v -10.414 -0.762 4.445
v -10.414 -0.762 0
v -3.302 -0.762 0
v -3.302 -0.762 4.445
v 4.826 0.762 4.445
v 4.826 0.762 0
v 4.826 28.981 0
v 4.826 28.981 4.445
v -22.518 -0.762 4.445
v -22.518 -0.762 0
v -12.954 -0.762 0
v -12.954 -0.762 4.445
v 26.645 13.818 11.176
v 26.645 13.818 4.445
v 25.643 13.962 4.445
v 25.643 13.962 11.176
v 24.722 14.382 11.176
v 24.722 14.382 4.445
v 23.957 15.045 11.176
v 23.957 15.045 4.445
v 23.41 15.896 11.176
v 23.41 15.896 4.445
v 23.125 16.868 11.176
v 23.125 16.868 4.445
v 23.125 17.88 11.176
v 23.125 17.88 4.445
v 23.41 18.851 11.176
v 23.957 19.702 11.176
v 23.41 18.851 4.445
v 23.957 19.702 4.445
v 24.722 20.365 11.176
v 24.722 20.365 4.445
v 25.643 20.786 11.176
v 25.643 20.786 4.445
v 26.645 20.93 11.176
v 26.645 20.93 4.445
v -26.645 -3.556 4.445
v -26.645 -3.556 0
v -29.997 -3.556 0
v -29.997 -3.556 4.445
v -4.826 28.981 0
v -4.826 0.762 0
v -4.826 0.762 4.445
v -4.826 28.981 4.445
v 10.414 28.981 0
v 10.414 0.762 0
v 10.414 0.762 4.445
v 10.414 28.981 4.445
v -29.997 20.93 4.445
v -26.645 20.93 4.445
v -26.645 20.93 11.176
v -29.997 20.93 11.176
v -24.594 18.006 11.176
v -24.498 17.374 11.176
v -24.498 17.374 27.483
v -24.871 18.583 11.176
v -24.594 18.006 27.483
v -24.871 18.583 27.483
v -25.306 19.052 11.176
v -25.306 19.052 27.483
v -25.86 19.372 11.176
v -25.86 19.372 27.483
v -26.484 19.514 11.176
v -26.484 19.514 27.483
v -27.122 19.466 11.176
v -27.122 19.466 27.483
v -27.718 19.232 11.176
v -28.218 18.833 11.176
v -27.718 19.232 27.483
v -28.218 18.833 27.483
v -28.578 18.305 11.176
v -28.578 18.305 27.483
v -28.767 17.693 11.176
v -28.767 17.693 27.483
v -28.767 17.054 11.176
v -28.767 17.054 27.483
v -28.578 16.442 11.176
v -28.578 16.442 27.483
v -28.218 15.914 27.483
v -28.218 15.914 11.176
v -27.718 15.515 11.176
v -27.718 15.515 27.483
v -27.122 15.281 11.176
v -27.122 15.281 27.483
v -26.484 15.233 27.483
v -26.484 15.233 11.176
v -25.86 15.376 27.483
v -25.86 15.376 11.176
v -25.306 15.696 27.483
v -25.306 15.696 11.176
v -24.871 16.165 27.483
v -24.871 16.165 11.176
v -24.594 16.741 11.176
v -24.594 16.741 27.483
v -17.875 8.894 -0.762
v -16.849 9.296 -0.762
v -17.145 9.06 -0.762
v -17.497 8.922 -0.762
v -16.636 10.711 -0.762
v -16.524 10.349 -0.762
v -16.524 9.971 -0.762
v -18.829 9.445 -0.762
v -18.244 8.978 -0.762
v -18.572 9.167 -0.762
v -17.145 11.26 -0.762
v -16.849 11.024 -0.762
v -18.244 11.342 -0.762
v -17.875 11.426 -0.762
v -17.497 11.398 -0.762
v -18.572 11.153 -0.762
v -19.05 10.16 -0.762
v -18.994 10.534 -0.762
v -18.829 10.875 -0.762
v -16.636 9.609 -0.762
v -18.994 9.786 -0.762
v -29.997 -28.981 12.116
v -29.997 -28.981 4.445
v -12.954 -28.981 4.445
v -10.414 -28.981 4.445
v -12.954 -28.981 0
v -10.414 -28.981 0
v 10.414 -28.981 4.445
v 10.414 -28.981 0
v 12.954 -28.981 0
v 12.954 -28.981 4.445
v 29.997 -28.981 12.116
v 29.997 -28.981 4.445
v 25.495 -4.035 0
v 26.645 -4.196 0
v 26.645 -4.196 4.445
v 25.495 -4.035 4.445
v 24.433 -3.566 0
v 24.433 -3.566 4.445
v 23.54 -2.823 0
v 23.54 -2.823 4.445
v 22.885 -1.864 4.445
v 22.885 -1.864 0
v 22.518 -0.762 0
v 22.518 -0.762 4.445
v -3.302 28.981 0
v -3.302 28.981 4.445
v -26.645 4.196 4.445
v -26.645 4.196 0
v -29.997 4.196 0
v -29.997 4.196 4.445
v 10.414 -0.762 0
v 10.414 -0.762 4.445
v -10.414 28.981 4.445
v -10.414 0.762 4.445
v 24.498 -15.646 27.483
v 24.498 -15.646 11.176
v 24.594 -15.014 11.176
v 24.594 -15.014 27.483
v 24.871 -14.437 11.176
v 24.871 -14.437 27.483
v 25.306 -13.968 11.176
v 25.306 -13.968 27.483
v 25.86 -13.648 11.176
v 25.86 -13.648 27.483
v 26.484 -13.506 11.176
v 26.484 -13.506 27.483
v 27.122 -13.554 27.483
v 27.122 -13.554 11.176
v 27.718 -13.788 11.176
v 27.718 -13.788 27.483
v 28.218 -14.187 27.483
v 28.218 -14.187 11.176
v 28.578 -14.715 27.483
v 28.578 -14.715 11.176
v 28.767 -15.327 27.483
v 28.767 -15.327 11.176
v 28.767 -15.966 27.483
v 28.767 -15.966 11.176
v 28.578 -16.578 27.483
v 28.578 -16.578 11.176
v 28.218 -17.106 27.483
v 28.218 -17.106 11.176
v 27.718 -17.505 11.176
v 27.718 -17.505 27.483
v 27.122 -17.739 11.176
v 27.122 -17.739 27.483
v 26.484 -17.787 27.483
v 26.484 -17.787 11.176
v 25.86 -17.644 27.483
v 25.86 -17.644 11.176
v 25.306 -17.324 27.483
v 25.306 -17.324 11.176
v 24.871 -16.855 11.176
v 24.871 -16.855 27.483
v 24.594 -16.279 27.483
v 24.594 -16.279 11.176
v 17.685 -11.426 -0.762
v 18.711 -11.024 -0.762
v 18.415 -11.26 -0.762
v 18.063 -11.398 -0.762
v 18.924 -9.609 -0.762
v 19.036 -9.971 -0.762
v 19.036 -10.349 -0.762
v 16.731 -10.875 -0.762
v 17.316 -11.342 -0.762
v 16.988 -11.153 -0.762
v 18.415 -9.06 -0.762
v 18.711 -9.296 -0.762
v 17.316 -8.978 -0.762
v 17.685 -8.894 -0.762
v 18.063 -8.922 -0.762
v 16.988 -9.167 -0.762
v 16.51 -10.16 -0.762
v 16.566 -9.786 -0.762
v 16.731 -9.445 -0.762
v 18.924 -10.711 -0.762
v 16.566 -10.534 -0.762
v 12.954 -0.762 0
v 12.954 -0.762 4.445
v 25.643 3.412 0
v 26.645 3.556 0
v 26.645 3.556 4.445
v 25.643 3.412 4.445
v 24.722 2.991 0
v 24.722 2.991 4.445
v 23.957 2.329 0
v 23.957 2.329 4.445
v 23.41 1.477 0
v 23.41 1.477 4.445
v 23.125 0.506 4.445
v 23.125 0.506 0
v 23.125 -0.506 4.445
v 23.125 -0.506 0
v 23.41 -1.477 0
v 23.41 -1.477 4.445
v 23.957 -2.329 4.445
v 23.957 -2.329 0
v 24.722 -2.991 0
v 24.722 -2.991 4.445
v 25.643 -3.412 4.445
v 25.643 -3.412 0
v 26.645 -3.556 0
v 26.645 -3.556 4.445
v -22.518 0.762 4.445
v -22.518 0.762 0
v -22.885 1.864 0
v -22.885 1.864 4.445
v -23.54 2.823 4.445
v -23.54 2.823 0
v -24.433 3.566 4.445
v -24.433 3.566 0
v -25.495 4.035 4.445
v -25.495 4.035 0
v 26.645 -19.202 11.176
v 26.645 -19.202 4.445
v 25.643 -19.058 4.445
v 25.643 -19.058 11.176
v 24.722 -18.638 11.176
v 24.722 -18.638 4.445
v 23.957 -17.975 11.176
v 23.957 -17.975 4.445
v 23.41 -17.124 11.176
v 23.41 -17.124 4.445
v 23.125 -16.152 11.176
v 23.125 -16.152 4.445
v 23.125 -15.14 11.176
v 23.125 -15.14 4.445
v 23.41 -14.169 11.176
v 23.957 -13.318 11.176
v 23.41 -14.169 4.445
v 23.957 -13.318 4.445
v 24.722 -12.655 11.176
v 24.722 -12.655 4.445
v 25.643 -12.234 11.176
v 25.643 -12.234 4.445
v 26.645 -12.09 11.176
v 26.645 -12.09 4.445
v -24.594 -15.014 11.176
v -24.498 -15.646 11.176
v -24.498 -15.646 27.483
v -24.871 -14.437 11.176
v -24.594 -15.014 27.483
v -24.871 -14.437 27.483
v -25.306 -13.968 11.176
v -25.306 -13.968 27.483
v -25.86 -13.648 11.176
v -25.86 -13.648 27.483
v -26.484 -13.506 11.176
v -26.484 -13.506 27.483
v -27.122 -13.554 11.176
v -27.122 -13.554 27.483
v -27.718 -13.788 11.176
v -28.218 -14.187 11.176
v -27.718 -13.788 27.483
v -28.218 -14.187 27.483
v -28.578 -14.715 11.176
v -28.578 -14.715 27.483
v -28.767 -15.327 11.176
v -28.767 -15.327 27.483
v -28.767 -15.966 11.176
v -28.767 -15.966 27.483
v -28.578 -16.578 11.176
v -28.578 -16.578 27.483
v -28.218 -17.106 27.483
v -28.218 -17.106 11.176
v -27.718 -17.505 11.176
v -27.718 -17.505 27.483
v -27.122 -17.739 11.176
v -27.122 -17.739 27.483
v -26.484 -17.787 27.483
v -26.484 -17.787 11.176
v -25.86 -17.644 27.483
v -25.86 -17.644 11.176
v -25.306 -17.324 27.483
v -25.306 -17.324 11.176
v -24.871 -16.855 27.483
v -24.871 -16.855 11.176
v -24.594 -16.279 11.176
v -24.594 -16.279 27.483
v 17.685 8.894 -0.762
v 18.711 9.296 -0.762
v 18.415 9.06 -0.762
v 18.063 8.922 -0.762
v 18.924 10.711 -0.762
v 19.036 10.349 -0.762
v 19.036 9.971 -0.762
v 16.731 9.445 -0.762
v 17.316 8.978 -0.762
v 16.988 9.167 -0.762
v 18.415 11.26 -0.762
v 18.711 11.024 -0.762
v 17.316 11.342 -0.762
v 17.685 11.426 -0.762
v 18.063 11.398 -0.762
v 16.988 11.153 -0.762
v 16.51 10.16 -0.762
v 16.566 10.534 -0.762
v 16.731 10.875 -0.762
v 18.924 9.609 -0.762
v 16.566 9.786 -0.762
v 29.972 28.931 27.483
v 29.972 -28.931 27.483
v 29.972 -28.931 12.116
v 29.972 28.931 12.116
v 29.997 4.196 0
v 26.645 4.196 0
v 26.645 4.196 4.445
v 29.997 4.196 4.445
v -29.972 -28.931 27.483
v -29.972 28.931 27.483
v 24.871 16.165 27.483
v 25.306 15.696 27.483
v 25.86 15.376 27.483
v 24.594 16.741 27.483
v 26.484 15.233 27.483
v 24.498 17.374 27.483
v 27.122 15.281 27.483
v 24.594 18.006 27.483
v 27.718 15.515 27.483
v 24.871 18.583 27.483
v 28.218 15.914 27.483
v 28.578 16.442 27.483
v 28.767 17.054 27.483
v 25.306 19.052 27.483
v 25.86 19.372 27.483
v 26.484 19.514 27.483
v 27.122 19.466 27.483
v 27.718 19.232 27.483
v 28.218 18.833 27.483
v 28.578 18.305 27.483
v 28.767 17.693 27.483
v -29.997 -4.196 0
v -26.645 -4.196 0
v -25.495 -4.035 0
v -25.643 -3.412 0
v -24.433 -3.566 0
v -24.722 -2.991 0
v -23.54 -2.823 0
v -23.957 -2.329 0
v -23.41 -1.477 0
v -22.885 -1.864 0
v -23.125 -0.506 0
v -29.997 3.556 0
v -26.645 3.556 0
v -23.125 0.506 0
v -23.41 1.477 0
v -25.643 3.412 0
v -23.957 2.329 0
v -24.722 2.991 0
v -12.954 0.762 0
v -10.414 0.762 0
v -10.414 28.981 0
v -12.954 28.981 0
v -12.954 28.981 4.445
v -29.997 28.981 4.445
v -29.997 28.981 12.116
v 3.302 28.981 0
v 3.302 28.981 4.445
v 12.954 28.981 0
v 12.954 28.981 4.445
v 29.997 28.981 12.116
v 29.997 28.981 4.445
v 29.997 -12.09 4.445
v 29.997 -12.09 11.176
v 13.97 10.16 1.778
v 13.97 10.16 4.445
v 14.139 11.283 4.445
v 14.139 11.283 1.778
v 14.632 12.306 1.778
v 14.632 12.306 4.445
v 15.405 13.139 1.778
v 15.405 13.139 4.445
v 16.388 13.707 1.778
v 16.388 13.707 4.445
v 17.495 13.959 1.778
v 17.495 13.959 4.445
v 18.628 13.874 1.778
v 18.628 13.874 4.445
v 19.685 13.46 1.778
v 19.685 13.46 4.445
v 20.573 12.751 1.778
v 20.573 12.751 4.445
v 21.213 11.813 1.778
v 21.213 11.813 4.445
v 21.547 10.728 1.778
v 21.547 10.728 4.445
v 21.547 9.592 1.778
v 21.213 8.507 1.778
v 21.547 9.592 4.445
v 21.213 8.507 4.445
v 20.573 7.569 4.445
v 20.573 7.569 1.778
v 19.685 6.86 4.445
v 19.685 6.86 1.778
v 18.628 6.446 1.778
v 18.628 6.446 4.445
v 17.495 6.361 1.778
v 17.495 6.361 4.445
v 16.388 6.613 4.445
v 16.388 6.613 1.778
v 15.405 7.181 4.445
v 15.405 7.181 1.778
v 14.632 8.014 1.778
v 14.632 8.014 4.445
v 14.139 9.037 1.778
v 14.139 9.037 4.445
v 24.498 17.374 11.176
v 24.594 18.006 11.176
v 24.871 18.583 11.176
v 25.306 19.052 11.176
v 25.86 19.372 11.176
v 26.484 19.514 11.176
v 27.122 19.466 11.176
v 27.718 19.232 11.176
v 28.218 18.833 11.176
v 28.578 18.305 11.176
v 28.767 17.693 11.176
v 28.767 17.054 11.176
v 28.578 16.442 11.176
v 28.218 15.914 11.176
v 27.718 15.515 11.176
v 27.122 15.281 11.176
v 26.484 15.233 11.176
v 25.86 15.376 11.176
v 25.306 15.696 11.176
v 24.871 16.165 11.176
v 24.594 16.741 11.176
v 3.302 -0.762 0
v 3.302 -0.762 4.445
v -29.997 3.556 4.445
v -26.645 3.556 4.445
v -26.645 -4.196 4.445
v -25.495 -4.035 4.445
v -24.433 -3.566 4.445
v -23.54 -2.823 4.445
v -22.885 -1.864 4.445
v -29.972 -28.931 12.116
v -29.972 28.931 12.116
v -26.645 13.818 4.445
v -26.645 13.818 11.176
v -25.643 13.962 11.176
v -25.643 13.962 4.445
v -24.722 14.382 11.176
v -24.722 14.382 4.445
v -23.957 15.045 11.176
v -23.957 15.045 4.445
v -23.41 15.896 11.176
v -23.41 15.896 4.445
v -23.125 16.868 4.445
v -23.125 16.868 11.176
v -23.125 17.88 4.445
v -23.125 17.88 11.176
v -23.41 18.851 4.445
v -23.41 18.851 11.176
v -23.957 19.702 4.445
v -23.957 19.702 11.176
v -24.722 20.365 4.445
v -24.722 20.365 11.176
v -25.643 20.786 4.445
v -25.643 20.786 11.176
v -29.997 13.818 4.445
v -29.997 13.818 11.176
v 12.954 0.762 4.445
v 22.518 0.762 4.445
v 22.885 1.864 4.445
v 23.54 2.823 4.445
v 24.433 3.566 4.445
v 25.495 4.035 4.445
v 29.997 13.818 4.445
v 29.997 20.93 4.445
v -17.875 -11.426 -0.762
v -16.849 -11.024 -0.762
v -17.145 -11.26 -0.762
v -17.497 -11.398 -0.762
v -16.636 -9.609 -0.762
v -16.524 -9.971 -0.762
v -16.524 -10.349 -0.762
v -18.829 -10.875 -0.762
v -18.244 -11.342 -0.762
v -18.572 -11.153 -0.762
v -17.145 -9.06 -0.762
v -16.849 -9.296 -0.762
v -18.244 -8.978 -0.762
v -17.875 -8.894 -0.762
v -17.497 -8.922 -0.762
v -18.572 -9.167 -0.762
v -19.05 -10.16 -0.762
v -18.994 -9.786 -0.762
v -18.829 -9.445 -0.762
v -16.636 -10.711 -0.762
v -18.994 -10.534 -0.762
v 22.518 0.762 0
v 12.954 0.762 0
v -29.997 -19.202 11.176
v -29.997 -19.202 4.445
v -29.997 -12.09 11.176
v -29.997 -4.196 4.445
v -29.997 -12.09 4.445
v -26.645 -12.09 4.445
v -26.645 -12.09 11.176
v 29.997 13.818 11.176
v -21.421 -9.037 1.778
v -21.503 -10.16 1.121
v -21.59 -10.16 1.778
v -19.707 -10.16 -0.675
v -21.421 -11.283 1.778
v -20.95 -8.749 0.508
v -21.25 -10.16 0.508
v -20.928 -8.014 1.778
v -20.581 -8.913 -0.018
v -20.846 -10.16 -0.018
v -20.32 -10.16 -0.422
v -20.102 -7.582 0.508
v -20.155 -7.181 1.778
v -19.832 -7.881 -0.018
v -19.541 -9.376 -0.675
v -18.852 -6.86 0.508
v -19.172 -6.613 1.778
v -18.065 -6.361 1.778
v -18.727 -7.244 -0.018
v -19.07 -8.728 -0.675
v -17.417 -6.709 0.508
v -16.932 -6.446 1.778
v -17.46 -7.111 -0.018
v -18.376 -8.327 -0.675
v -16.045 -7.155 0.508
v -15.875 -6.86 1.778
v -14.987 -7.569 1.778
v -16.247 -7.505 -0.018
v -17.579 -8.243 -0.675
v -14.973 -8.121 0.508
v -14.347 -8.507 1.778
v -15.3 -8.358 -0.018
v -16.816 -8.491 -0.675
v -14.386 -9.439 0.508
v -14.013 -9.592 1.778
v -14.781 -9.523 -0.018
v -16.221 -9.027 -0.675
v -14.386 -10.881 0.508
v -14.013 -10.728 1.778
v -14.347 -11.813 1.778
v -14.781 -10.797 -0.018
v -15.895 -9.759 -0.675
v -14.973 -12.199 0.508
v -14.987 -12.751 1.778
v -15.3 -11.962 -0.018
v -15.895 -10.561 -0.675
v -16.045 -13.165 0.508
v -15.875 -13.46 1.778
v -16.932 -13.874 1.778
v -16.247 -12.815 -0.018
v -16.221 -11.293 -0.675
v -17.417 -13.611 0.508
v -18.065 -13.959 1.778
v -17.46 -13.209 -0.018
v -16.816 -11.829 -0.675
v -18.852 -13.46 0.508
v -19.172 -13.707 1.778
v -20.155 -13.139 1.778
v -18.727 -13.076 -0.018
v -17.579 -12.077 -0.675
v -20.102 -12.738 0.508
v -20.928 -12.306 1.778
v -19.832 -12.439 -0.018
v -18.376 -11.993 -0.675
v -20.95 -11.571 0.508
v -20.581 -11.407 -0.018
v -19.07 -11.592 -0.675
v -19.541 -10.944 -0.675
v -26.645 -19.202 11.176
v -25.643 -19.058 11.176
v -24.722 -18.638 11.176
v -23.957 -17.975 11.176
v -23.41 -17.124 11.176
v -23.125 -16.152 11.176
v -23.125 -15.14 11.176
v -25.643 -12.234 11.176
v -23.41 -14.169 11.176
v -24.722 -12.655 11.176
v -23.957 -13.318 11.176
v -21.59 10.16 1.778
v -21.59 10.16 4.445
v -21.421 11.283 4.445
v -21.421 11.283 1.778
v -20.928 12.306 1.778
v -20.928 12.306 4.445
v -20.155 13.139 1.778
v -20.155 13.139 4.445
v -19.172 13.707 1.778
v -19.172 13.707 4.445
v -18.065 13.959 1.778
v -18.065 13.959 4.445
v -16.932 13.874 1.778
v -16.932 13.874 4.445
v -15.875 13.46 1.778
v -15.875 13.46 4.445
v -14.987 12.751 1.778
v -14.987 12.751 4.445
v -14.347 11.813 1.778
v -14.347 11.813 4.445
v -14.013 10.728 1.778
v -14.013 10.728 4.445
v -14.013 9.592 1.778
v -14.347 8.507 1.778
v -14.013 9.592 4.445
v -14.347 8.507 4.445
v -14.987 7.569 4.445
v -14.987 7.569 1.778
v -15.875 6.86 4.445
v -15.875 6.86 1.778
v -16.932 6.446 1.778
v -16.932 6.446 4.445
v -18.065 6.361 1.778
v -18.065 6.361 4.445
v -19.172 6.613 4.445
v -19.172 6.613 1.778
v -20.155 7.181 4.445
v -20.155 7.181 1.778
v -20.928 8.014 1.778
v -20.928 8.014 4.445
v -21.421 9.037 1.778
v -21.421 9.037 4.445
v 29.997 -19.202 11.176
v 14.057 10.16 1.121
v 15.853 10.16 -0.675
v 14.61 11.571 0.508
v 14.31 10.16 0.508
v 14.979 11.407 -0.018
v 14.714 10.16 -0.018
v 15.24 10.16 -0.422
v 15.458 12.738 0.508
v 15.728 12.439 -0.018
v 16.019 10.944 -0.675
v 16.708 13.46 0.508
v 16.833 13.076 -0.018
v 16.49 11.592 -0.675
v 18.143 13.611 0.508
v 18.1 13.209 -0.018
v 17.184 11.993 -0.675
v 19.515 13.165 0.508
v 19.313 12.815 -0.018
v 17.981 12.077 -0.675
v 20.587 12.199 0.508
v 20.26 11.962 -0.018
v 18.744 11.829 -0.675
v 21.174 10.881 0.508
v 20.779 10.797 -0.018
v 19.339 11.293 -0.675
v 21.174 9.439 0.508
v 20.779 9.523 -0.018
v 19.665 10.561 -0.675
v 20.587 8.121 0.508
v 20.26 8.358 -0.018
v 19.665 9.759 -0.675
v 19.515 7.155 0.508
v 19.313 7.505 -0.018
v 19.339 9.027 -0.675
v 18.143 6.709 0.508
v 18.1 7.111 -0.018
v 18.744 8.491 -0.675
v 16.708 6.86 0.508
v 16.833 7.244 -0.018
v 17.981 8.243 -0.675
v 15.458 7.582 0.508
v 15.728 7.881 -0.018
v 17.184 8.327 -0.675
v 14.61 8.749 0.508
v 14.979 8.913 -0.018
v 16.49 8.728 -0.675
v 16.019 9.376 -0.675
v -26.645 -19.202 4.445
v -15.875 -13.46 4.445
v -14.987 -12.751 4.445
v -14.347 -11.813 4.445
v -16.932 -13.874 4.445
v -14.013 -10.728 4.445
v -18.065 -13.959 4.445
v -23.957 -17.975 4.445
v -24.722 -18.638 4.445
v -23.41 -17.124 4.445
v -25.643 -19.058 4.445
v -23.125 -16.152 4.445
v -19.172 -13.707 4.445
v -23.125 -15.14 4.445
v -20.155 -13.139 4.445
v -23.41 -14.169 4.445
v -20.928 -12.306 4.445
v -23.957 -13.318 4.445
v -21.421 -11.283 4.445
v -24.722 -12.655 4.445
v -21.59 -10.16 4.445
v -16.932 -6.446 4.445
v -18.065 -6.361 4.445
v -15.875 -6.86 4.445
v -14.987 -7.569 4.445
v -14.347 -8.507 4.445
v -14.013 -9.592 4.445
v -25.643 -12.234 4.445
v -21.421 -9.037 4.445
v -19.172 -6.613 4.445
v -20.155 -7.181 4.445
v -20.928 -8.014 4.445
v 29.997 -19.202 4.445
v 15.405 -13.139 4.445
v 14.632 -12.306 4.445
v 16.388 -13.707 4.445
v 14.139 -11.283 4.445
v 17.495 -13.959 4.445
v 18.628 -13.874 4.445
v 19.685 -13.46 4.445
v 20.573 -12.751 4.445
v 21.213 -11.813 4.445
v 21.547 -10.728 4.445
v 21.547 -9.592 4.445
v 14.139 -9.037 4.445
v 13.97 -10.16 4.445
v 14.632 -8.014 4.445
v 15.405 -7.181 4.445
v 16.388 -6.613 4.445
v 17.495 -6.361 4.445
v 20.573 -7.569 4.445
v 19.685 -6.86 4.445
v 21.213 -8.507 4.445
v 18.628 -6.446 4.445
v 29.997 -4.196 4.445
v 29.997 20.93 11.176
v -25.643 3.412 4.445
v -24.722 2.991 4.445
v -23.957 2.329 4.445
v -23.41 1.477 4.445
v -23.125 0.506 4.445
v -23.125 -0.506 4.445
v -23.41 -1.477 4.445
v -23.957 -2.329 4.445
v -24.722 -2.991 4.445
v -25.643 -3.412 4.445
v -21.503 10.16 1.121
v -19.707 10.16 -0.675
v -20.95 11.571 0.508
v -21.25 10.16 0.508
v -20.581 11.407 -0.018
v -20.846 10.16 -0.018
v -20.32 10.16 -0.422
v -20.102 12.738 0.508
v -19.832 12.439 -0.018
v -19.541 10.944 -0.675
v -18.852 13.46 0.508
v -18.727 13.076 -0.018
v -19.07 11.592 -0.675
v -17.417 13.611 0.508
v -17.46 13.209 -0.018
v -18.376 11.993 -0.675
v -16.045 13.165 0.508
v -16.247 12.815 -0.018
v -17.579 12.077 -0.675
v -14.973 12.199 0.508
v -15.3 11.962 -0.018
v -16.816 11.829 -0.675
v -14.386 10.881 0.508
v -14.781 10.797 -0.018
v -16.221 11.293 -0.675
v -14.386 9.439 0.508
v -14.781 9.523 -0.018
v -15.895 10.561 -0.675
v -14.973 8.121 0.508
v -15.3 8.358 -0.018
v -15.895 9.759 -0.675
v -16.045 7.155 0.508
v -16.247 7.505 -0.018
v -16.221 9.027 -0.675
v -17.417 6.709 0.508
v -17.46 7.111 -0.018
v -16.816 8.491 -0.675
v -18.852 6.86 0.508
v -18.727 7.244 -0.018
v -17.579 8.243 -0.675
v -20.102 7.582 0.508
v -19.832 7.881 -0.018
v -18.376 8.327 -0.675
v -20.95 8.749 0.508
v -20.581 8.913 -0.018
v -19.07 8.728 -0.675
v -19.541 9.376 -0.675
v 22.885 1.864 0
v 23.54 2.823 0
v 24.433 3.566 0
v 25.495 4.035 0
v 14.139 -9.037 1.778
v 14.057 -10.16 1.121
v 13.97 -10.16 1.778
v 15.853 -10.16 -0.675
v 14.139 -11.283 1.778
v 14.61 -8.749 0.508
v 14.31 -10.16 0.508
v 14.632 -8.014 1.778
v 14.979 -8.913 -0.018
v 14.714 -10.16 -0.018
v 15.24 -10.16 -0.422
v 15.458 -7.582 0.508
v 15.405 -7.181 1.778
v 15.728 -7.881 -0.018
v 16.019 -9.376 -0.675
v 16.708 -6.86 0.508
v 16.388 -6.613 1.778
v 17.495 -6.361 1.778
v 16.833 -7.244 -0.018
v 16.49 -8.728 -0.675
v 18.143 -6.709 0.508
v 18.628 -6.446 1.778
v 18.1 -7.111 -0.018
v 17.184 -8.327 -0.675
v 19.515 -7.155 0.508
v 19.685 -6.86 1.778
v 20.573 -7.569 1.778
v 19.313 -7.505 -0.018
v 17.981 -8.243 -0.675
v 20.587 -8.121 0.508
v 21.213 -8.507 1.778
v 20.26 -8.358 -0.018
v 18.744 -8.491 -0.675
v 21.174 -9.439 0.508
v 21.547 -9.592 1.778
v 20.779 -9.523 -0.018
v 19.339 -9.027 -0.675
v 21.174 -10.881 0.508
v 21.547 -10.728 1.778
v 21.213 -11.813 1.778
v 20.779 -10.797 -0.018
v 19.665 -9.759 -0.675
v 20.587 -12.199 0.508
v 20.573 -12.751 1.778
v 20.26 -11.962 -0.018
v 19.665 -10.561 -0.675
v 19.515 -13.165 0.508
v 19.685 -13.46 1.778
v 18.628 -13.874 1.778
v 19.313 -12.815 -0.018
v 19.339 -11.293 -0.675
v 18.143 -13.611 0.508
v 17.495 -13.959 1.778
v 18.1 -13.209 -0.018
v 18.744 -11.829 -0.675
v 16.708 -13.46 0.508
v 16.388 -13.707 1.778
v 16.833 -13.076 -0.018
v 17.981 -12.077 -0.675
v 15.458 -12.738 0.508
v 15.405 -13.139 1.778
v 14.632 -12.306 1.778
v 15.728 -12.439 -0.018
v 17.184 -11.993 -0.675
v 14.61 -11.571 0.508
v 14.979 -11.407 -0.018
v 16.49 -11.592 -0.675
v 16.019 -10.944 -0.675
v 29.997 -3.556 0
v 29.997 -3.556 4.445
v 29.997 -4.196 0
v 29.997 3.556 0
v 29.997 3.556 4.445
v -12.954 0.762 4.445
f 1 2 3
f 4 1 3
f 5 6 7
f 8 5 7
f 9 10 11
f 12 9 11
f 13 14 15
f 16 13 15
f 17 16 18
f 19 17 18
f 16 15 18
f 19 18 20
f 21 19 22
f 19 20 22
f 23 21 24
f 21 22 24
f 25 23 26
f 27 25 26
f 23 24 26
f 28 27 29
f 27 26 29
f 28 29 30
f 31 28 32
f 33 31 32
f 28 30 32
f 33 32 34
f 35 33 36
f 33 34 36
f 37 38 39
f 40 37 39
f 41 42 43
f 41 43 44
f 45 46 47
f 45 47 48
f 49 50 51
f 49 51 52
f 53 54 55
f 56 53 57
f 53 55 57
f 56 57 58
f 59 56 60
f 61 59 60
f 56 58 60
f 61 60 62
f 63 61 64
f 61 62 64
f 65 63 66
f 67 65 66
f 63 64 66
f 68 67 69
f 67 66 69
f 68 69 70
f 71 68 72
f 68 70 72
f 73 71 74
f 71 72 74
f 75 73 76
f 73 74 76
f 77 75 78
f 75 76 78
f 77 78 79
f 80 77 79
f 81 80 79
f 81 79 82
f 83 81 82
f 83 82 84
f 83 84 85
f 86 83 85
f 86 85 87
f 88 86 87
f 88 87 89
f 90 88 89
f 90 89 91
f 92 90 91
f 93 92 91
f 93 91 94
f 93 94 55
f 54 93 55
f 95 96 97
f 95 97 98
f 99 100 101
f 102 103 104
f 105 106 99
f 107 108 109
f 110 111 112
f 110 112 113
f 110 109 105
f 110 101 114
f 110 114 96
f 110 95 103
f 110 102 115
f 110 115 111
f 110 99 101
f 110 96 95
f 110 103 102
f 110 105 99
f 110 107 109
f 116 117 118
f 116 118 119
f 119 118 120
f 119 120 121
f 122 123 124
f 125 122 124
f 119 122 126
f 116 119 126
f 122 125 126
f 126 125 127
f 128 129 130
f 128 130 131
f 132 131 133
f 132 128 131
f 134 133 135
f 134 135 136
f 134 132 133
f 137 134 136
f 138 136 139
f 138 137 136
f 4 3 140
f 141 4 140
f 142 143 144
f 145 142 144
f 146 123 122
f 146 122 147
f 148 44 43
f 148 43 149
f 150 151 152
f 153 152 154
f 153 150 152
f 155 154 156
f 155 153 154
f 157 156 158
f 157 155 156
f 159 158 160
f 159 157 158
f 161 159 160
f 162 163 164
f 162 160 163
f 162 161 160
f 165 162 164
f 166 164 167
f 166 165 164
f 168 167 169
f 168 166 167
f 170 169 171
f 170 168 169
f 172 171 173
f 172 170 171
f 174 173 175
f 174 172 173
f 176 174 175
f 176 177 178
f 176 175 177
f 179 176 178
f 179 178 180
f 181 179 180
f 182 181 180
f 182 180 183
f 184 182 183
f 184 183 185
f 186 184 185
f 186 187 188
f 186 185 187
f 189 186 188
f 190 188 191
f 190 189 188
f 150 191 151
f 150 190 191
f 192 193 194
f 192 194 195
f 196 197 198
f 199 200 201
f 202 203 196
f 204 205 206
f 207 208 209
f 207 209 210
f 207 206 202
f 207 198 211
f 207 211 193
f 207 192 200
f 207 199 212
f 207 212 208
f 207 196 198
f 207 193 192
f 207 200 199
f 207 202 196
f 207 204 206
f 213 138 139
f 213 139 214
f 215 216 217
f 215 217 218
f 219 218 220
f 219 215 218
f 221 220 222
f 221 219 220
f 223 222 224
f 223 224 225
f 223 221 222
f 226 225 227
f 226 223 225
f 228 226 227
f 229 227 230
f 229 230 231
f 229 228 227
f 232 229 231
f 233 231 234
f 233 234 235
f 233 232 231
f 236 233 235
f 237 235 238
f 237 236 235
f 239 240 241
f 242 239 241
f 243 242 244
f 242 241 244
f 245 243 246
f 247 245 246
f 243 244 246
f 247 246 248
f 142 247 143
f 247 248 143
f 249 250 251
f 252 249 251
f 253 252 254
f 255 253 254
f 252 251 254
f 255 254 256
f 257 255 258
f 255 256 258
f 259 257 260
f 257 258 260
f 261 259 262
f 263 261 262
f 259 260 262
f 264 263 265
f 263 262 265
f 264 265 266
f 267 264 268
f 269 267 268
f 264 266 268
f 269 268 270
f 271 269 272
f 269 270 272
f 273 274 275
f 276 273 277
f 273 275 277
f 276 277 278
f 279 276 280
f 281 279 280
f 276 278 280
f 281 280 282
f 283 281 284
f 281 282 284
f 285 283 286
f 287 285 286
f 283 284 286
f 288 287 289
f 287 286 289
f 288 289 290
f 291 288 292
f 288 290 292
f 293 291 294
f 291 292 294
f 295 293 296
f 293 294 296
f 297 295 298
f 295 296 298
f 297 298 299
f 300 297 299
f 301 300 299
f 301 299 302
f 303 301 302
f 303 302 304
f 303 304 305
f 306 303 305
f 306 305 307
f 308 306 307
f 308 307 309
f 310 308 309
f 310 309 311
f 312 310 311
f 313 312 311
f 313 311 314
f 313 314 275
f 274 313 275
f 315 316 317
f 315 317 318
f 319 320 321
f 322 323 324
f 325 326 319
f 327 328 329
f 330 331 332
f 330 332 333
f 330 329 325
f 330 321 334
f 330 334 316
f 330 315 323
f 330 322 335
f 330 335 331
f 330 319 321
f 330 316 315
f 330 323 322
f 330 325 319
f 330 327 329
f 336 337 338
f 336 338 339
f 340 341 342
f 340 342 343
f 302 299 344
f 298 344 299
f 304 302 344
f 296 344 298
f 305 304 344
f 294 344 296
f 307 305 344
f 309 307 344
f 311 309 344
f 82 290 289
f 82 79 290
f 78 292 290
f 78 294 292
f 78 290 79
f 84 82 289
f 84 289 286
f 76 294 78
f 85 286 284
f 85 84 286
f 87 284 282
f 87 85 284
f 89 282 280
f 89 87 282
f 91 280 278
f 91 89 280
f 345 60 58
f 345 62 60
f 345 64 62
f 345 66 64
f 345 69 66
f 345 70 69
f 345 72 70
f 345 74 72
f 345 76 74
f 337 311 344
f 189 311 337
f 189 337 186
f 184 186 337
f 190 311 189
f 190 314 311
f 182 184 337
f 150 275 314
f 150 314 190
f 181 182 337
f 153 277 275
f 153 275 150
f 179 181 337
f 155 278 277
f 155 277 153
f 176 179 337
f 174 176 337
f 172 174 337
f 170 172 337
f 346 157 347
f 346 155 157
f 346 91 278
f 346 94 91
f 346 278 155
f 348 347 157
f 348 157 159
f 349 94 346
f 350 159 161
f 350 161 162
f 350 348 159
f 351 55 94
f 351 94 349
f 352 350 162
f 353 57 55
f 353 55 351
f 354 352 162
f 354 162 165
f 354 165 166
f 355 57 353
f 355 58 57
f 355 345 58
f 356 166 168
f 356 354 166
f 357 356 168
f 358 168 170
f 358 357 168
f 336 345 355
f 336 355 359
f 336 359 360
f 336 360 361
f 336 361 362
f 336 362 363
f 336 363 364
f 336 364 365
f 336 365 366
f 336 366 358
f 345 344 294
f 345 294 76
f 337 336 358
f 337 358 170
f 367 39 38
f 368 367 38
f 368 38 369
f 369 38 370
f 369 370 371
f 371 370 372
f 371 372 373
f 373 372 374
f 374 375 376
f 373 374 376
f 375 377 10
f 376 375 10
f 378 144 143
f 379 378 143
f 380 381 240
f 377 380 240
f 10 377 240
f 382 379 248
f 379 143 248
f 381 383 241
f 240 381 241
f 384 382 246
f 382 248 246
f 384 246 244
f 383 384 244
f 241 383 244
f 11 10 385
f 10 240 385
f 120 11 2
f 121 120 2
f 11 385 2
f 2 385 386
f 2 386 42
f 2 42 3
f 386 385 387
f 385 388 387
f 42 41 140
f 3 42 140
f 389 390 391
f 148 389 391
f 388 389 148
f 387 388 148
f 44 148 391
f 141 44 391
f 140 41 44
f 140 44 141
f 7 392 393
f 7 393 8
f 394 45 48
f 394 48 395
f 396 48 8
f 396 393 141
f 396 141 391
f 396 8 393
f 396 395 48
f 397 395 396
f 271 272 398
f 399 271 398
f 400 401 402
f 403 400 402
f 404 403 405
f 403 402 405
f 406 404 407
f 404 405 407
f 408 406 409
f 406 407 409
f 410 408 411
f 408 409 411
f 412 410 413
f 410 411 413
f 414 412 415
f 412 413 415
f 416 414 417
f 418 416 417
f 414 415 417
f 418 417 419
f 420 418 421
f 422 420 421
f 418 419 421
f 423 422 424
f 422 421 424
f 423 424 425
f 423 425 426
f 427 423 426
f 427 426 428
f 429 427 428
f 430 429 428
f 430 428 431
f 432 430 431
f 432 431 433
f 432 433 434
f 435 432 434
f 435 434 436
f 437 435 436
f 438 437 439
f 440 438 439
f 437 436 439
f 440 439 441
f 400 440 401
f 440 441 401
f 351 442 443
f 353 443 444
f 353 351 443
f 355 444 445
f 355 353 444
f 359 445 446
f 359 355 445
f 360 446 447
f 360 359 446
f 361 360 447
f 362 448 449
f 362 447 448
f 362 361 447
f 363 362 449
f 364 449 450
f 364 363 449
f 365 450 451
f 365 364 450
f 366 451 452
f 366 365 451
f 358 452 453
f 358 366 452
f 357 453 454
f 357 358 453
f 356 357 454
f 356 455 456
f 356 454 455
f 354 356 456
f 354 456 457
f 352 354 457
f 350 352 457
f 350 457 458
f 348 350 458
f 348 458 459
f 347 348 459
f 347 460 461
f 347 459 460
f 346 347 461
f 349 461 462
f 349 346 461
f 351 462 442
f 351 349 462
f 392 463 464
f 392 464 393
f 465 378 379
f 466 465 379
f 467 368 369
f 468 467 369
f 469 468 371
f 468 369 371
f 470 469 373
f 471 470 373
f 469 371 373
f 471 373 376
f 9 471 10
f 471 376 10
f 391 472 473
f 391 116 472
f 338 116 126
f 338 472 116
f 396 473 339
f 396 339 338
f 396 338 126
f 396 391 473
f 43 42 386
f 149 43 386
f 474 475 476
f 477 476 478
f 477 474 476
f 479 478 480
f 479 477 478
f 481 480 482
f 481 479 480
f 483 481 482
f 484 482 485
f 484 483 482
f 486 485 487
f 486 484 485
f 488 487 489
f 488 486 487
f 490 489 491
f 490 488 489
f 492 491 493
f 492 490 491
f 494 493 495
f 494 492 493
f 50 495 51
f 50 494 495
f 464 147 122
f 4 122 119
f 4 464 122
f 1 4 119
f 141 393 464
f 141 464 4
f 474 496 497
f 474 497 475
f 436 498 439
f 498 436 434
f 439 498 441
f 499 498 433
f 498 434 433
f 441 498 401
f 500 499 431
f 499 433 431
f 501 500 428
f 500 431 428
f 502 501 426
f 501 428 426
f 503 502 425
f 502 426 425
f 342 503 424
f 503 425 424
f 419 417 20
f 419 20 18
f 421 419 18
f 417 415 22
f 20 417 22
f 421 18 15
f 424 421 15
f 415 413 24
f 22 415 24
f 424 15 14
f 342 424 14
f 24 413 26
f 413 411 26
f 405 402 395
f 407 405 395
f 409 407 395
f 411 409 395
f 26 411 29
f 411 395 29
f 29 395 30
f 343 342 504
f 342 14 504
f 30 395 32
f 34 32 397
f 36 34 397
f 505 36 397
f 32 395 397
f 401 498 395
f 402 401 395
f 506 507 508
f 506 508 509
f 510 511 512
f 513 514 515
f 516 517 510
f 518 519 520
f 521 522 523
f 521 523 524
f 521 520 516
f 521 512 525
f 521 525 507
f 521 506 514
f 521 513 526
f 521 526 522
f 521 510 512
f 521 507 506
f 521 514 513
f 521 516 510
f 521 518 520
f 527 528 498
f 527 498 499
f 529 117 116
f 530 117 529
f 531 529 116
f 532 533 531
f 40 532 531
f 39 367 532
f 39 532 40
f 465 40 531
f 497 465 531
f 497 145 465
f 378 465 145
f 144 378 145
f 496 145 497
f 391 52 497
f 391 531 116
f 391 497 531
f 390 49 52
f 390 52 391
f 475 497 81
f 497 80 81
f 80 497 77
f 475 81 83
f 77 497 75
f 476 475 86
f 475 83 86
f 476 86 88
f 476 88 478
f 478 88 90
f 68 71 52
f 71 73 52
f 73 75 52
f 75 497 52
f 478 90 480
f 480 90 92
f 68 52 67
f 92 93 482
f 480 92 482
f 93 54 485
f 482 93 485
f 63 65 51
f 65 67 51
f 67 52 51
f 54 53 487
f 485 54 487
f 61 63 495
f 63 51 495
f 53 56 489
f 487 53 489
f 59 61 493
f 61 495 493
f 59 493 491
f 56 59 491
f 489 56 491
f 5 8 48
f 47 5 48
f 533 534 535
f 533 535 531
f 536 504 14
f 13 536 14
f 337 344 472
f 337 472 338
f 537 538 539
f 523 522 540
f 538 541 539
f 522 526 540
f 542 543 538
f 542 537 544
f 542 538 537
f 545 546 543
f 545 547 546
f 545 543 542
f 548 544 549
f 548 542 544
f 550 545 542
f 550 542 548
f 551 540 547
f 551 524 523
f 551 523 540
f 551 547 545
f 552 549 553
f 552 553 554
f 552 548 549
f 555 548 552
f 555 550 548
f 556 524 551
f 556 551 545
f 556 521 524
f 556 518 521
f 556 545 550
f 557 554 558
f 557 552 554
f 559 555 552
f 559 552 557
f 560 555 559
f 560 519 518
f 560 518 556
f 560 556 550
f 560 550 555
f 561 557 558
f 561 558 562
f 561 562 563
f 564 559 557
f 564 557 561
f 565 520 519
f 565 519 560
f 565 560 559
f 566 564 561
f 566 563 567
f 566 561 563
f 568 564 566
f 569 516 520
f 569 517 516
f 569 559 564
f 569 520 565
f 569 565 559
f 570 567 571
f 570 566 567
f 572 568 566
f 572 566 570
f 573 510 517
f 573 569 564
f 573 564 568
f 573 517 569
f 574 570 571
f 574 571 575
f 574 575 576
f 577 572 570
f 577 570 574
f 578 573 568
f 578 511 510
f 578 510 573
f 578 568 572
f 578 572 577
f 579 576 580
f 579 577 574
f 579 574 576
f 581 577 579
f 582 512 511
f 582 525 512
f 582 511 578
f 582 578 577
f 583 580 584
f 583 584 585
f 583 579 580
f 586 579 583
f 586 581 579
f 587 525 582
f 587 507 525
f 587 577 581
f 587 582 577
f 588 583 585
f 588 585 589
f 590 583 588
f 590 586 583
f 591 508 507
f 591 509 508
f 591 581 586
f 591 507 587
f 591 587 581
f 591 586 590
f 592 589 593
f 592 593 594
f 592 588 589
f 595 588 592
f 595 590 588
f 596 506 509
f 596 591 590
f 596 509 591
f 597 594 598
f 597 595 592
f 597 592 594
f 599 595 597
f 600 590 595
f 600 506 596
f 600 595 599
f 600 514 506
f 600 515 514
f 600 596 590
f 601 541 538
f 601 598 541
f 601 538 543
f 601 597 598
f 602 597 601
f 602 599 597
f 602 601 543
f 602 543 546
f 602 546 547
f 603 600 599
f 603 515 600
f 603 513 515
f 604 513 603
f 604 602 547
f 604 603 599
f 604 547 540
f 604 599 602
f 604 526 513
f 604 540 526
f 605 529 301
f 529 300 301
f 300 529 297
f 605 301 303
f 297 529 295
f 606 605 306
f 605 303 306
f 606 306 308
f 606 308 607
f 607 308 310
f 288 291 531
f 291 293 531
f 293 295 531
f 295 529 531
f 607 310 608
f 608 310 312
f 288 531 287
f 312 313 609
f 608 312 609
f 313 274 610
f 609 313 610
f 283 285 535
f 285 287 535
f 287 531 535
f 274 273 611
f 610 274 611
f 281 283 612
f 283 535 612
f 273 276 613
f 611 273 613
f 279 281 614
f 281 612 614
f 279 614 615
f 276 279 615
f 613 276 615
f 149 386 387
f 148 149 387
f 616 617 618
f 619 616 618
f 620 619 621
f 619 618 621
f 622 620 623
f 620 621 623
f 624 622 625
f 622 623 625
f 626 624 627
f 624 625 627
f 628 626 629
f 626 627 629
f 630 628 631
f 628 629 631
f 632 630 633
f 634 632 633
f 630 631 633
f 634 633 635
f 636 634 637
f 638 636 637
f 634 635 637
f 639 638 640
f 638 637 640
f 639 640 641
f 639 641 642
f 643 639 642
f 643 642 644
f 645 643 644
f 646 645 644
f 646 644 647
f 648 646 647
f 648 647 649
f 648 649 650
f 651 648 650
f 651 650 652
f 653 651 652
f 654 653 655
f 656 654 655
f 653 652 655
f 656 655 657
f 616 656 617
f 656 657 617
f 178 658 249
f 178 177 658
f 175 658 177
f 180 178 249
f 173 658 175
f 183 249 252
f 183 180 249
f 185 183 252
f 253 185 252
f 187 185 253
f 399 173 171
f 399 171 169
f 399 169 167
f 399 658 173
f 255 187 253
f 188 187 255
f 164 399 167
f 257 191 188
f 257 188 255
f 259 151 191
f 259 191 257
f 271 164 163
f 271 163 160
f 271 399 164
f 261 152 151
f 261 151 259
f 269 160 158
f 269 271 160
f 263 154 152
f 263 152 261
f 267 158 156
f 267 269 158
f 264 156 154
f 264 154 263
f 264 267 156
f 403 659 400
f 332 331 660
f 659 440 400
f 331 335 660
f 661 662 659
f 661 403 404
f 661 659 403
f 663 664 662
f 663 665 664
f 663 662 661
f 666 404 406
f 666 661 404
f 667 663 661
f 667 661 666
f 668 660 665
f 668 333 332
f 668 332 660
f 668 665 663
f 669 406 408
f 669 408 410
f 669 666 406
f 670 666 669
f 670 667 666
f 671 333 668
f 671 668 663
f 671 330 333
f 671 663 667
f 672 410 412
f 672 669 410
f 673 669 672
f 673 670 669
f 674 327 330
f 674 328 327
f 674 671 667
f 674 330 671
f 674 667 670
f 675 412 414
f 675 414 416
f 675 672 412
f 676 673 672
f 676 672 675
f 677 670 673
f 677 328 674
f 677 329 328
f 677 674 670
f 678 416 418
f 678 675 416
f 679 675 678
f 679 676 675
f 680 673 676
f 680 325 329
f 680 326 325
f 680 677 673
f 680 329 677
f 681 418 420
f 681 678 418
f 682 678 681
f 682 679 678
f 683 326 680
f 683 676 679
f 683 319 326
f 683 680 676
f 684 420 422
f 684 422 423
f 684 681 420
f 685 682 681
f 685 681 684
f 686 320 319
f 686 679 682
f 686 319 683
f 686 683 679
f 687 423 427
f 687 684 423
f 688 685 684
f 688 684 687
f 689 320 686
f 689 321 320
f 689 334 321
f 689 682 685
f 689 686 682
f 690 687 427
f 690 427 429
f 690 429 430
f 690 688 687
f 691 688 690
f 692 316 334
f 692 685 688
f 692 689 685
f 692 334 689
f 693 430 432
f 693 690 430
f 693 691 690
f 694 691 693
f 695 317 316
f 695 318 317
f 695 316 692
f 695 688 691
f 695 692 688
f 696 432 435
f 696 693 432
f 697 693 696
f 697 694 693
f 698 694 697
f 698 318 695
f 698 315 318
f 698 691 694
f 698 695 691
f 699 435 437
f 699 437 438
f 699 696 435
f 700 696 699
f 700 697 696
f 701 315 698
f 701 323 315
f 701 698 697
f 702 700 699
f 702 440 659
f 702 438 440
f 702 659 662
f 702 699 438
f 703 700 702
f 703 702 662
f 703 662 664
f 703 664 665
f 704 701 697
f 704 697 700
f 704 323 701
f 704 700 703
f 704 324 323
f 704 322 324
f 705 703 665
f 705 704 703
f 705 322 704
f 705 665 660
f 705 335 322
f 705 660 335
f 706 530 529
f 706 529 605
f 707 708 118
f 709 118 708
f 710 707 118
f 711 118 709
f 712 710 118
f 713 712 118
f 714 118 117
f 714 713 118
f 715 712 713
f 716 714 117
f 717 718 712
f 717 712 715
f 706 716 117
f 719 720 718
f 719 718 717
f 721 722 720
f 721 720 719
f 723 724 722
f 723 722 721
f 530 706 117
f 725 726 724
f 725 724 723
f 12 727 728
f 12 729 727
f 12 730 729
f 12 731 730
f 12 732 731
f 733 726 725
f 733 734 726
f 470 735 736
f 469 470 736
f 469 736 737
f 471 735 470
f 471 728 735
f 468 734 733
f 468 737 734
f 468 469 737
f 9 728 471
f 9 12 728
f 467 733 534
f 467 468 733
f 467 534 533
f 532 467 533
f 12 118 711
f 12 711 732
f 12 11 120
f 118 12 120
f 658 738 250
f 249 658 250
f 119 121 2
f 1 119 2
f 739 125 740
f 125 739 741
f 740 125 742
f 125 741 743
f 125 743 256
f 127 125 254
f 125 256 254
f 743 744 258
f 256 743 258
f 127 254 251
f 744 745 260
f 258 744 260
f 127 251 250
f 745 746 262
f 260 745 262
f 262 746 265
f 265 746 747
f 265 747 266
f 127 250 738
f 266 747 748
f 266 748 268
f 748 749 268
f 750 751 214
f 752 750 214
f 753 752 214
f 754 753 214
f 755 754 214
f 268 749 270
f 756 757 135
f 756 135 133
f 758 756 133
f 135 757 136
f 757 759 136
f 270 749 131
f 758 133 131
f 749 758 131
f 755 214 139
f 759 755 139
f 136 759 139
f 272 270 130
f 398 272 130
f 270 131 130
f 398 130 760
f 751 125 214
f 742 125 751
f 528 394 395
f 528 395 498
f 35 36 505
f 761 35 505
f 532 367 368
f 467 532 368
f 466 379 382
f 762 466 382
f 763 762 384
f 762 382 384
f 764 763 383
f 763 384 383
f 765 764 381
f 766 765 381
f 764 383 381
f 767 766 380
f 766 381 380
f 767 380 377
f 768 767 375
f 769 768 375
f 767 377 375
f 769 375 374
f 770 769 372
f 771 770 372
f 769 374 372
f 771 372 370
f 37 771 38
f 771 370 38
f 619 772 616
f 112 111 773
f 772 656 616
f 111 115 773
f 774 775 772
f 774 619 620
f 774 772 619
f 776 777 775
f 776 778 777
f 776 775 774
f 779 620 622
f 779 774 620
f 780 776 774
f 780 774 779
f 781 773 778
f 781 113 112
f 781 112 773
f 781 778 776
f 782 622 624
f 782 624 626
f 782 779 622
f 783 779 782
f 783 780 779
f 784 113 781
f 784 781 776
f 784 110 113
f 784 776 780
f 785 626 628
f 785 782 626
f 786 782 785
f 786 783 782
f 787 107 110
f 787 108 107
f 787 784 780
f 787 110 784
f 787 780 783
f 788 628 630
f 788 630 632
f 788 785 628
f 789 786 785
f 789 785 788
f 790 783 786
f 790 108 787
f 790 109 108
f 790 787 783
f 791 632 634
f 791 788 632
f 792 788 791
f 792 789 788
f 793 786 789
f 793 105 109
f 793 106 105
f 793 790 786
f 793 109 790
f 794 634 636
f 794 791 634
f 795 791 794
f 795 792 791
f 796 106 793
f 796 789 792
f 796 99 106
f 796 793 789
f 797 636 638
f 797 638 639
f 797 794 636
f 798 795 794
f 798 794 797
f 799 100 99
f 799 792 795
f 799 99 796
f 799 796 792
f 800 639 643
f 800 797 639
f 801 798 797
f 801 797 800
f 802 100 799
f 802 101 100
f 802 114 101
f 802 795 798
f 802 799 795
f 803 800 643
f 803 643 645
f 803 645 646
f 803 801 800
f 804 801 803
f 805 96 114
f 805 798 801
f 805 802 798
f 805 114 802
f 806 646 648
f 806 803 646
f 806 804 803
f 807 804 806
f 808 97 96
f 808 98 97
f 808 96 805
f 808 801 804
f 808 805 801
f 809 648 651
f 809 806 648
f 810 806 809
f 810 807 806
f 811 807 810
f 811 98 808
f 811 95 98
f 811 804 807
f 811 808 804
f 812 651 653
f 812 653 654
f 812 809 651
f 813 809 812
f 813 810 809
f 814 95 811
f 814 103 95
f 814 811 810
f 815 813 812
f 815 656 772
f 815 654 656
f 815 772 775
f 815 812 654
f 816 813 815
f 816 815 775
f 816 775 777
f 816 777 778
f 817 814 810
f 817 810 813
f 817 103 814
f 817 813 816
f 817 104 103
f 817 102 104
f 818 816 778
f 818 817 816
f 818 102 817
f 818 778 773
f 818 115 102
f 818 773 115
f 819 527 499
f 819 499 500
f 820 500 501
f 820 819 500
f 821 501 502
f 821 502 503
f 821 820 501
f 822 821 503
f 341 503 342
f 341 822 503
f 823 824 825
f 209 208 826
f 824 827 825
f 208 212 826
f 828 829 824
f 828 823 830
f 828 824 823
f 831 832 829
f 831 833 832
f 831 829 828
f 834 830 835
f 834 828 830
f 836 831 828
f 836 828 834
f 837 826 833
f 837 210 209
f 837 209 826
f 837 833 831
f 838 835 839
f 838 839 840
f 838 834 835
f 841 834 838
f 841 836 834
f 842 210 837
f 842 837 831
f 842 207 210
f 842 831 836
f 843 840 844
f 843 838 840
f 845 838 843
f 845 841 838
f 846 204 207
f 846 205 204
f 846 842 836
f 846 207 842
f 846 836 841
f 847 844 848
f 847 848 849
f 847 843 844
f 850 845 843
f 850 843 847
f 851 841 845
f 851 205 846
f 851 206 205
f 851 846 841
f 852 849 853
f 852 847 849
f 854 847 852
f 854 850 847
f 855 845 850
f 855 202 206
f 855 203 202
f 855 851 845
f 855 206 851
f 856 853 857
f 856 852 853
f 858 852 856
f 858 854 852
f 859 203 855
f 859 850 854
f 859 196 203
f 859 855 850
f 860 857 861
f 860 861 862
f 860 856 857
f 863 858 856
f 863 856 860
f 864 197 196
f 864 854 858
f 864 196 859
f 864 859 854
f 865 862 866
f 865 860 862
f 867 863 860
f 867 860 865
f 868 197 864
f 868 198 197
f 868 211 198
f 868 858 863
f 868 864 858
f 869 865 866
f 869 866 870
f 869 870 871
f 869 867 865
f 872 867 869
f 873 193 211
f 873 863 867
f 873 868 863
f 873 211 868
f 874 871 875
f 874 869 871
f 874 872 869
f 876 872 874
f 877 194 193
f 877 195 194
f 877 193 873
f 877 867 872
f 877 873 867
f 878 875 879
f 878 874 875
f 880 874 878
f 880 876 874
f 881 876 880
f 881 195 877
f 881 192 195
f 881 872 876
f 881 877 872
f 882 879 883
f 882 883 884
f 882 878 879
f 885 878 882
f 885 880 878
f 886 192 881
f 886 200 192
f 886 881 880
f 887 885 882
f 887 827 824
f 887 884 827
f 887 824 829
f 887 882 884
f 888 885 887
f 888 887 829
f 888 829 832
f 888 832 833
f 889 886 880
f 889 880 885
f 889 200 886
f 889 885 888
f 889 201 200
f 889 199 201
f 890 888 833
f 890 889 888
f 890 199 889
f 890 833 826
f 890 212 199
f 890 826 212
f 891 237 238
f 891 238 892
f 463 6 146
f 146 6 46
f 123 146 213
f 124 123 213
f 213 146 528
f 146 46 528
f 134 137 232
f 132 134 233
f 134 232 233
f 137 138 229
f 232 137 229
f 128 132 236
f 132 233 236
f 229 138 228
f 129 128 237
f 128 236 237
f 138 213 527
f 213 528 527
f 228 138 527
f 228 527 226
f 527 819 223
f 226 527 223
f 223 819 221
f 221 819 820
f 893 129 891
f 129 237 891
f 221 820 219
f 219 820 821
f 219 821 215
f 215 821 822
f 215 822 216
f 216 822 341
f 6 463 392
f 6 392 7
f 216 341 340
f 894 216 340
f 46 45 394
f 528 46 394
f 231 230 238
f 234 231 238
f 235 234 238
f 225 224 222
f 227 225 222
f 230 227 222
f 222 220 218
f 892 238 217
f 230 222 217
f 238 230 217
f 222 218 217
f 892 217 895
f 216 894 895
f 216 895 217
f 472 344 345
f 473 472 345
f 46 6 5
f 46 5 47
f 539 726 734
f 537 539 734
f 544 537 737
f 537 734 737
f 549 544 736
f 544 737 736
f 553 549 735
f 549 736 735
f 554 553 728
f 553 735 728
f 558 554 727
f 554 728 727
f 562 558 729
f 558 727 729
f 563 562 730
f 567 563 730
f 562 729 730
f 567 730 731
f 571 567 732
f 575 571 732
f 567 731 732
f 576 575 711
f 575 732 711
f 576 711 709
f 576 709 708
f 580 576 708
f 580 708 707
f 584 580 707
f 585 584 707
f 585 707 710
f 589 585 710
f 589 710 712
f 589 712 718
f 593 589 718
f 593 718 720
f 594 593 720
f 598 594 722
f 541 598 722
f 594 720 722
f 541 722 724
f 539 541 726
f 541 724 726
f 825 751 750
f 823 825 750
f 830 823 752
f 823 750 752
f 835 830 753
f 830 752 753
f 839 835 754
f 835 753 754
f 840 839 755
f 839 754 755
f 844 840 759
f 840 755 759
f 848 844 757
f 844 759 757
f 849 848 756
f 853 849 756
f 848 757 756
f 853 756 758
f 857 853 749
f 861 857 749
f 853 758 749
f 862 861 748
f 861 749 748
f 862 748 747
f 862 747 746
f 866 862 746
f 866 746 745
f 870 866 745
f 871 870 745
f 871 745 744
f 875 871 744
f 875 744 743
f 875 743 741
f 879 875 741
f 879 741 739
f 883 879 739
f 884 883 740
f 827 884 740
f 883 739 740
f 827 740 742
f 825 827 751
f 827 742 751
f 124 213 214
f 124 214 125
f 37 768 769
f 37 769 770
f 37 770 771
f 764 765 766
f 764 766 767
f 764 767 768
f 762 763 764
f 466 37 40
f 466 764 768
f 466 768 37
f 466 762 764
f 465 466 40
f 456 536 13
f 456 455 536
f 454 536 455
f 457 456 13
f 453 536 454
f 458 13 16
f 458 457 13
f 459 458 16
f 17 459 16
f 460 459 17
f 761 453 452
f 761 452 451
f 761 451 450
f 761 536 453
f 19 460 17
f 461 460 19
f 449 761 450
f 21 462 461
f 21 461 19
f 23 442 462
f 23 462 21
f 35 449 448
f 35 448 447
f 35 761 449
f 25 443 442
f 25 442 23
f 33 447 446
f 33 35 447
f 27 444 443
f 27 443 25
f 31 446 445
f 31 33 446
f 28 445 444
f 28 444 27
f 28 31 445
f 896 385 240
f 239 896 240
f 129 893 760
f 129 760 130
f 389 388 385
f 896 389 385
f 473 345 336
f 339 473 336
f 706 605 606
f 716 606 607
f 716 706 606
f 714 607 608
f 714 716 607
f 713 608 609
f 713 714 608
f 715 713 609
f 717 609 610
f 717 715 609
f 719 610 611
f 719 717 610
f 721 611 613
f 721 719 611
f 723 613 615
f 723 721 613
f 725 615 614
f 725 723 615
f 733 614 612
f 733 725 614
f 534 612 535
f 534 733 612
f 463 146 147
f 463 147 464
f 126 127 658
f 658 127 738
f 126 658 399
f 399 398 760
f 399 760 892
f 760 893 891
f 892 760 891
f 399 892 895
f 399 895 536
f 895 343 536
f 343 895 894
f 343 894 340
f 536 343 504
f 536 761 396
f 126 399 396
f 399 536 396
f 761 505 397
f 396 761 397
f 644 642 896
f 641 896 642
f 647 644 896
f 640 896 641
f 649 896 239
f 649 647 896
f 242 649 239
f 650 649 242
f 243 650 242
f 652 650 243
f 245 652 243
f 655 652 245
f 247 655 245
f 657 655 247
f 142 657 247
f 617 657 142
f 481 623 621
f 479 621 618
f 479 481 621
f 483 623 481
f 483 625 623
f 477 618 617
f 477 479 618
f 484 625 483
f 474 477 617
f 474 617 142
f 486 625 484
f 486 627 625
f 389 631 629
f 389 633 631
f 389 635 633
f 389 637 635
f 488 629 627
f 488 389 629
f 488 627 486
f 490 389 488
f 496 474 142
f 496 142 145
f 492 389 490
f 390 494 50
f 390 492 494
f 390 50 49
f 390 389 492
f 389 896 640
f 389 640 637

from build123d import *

# Parameters (mm, degrees)
SKETCH1_W           = 59.9948
SKETCH1_H           = 57.9628
BOSS_EXTRUDE1_DEPTH = 27.4828
SKETCH2_R           = 2.1463
CUT_EXTRUDE1_DEPTH  = 50.950674155
CUT_EXTRUDE2_DEPTH  = 11.176
SKETCH4_W           = 5.588
SKETCH4_H           = 28.2194
CUT_EXTRUDE3_DEPTH  = 4.445
SKETCH5_W           = 59.9948
SKETCH5_H           = 57.9628
SKETCH5_W_2         = 59.944
SKETCH5_H_2         = 57.8612
CUT_EXTRUDE4_DEPTH  = 15.367
SKETCH6_R           = 3.81
BOSS_EXTRUDE2_DEPTH = 5.207
FILLET1_R           = 2.54


with BuildPart() as part:
    # Sketch1 → Boss-Extrude1 (new body)
    with BuildSketch(Plane.XY):
        Rectangle(SKETCH1_W, SKETCH1_H)
    extrude(amount=BOSS_EXTRUDE1_DEPTH)

    # Sketch2 → Cut-Extrude1 (cut, through all)
    with BuildSketch(Plane.XY.offset(27.4828)):
        with Locations((-26.6446, -15.6464)):
            Circle(SKETCH2_R)
        with Locations((-26.6446, 17.3736)):
            Circle(SKETCH2_R)
    cut_extrude1 = extrude(amount=-CUT_EXTRUDE1_DEPTH, mode=Mode.SUBTRACT)

    # Mirror1: Cut-Extrude1 across plane
    add(cut_extrude1.mirror(Plane(origin=(0, 0, 0), x_dir=(0, 0, 1), z_dir=(1, 0, 0))), mode=Mode.SUBTRACT)

    # Sketch3 → Cut-Extrude2 (cut)
    with BuildSketch(Plane(origin=(0, 0, 0), x_dir=(-1, 0, 0), z_dir=(0, 0, -1))):
        with BuildLine():
            Line((-26.6446, 20.9296), (-29.9974, 20.9296))
            Line((-29.9974, 20.9296), (-29.9974, 13.8176))
            Line((-29.9974, 13.8176), (-26.6446, 13.8176))
            ThreePointArc((-26.6446, 13.8176), (-23.0886, 17.3736), (-26.6446, 20.9296))
        make_face()
        with BuildLine():
            Line((-26.6446, -12.0904), (-29.9974, -12.0904))
            Line((-29.9974, -12.0904), (-29.9974, -19.2024))
            Line((-29.9974, -19.2024), (-26.6446, -19.2024))
            ThreePointArc((-26.6446, -19.2024), (-23.0886, -15.6464), (-26.6446, -12.0904))
        make_face()
        with BuildLine():
            Line((26.6446, 20.9296), (29.9974, 20.9296))
            Line((29.9974, 20.9296), (29.9974, 13.8176))
            Line((29.9974, 13.8176), (26.6446, 13.8176))
            ThreePointArc((26.6446, 13.8176), (23.0886, 17.3736), (26.6446, 20.9296))
        make_face()
        with BuildLine():
            Line((26.6446, -12.0904), (29.9974, -12.0904))
            Line((29.9974, -12.0904), (29.9974, -19.2024))
            Line((29.9974, -19.2024), (26.6446, -19.2024))
            ThreePointArc((26.6446, -19.2024), (23.0886, -15.6464), (26.6446, -12.0904))
        make_face()
    extrude(amount=-CUT_EXTRUDE2_DEPTH, mode=Mode.SUBTRACT)

    # Sketch4 → Cut-Extrude3 (cut)
    with BuildSketch(Plane(origin=(0, 0, 0), x_dir=(-1, 0, 0), z_dir=(0, 0, -1))):
        with BuildLine():
            ThreePointArc((22.518386513, 0.762), (23.960485441, 3.225183836), (26.6446, 4.195984001))
            Line((26.6446, 4.195984001), (29.9974, 4.195984001))
            Line((29.9974, 4.195984001), (29.9974, 28.9814))
            Line((29.9974, 28.9814), (12.954, 28.9814))
            Line((12.954, 28.9814), (12.954, 0.762))
            Line((12.954, 0.762), (22.518386513, 0.762))
        make_face()
        with BuildLine():
            Line((29.9974, -28.9814), (29.9974, -4.195984001))
            Line((29.9974, -4.195984001), (26.6446, -4.195984001))
            ThreePointArc((26.6446, -4.195984001), (23.960485441, -3.225183836), (22.518386513, -0.762))
            Line((22.518386513, -0.762), (12.954, -0.762))
            Line((12.954, -0.762), (12.954, -28.9814))
            Line((12.954, -28.9814), (29.9974, -28.9814))
        make_face()
        with BuildLine():
            Line((29.9974, -3.556), (29.9974, 3.556))
            Line((29.9974, 3.556), (26.6446, 3.556))
            ThreePointArc((26.6446, 3.556), (23.0886, 0), (26.6446, -3.556))
            Line((26.6446, -3.556), (29.9974, -3.556))
        make_face()
        Polygon((0, -28.9814), (10.414, -28.9814), (10.414, -0.762), (3.302, -0.762), (3.302, 28.9814), (0, 28.9814), align=None)
        with Locations((7.62, 14.8717)):
            Rectangle(SKETCH4_W, SKETCH4_H)
    cut_extrude3 = extrude(amount=-CUT_EXTRUDE3_DEPTH, mode=Mode.SUBTRACT)

    # Mirror2: Cut-Extrude3 across plane
    add(cut_extrude3.mirror(Plane(origin=(0, 0, 0), x_dir=(0, 0, 1), z_dir=(1, 0, 0))), mode=Mode.SUBTRACT)

    # Sketch5 → Cut-Extrude4 (cut)
    with BuildSketch(Plane.XY.offset(27.4828)):
        Rectangle(SKETCH5_W, SKETCH5_H)
        Rectangle(SKETCH5_W_2, SKETCH5_H_2, mode=Mode.SUBTRACT)
    extrude(amount=-CUT_EXTRUDE4_DEPTH, mode=Mode.SUBTRACT)

    # Sketch6 → Boss-Extrude2 (add)
    with BuildSketch(Plane(origin=(0, 0, 4.445), x_dir=(-1, 0, 0), z_dir=(0, 0, -1))):
        with Locations((-17.78, 10.16)):
            Circle(SKETCH6_R)
        with Locations((17.78, 10.16)):
            Circle(SKETCH6_R)
        with Locations((17.78, -10.16)):
            Circle(SKETCH6_R)
        with Locations((-17.78, -10.16)):
            Circle(SKETCH6_R)
    extrude(amount=BOSS_EXTRUDE2_DEPTH)

    # Fillet1
    fillet1_edges = [part.edges().sort_by_distance(p)[0] for p in [
        (21.59, 10.16, -0.762),
        (-13.97, 10.16, -0.762),
        (-13.97, -10.16, -0.762),
        (21.59, -10.16, -0.762),
    ]]
    fillet(fillet1_edges, radius=FILLET1_R)


solid = part.part
